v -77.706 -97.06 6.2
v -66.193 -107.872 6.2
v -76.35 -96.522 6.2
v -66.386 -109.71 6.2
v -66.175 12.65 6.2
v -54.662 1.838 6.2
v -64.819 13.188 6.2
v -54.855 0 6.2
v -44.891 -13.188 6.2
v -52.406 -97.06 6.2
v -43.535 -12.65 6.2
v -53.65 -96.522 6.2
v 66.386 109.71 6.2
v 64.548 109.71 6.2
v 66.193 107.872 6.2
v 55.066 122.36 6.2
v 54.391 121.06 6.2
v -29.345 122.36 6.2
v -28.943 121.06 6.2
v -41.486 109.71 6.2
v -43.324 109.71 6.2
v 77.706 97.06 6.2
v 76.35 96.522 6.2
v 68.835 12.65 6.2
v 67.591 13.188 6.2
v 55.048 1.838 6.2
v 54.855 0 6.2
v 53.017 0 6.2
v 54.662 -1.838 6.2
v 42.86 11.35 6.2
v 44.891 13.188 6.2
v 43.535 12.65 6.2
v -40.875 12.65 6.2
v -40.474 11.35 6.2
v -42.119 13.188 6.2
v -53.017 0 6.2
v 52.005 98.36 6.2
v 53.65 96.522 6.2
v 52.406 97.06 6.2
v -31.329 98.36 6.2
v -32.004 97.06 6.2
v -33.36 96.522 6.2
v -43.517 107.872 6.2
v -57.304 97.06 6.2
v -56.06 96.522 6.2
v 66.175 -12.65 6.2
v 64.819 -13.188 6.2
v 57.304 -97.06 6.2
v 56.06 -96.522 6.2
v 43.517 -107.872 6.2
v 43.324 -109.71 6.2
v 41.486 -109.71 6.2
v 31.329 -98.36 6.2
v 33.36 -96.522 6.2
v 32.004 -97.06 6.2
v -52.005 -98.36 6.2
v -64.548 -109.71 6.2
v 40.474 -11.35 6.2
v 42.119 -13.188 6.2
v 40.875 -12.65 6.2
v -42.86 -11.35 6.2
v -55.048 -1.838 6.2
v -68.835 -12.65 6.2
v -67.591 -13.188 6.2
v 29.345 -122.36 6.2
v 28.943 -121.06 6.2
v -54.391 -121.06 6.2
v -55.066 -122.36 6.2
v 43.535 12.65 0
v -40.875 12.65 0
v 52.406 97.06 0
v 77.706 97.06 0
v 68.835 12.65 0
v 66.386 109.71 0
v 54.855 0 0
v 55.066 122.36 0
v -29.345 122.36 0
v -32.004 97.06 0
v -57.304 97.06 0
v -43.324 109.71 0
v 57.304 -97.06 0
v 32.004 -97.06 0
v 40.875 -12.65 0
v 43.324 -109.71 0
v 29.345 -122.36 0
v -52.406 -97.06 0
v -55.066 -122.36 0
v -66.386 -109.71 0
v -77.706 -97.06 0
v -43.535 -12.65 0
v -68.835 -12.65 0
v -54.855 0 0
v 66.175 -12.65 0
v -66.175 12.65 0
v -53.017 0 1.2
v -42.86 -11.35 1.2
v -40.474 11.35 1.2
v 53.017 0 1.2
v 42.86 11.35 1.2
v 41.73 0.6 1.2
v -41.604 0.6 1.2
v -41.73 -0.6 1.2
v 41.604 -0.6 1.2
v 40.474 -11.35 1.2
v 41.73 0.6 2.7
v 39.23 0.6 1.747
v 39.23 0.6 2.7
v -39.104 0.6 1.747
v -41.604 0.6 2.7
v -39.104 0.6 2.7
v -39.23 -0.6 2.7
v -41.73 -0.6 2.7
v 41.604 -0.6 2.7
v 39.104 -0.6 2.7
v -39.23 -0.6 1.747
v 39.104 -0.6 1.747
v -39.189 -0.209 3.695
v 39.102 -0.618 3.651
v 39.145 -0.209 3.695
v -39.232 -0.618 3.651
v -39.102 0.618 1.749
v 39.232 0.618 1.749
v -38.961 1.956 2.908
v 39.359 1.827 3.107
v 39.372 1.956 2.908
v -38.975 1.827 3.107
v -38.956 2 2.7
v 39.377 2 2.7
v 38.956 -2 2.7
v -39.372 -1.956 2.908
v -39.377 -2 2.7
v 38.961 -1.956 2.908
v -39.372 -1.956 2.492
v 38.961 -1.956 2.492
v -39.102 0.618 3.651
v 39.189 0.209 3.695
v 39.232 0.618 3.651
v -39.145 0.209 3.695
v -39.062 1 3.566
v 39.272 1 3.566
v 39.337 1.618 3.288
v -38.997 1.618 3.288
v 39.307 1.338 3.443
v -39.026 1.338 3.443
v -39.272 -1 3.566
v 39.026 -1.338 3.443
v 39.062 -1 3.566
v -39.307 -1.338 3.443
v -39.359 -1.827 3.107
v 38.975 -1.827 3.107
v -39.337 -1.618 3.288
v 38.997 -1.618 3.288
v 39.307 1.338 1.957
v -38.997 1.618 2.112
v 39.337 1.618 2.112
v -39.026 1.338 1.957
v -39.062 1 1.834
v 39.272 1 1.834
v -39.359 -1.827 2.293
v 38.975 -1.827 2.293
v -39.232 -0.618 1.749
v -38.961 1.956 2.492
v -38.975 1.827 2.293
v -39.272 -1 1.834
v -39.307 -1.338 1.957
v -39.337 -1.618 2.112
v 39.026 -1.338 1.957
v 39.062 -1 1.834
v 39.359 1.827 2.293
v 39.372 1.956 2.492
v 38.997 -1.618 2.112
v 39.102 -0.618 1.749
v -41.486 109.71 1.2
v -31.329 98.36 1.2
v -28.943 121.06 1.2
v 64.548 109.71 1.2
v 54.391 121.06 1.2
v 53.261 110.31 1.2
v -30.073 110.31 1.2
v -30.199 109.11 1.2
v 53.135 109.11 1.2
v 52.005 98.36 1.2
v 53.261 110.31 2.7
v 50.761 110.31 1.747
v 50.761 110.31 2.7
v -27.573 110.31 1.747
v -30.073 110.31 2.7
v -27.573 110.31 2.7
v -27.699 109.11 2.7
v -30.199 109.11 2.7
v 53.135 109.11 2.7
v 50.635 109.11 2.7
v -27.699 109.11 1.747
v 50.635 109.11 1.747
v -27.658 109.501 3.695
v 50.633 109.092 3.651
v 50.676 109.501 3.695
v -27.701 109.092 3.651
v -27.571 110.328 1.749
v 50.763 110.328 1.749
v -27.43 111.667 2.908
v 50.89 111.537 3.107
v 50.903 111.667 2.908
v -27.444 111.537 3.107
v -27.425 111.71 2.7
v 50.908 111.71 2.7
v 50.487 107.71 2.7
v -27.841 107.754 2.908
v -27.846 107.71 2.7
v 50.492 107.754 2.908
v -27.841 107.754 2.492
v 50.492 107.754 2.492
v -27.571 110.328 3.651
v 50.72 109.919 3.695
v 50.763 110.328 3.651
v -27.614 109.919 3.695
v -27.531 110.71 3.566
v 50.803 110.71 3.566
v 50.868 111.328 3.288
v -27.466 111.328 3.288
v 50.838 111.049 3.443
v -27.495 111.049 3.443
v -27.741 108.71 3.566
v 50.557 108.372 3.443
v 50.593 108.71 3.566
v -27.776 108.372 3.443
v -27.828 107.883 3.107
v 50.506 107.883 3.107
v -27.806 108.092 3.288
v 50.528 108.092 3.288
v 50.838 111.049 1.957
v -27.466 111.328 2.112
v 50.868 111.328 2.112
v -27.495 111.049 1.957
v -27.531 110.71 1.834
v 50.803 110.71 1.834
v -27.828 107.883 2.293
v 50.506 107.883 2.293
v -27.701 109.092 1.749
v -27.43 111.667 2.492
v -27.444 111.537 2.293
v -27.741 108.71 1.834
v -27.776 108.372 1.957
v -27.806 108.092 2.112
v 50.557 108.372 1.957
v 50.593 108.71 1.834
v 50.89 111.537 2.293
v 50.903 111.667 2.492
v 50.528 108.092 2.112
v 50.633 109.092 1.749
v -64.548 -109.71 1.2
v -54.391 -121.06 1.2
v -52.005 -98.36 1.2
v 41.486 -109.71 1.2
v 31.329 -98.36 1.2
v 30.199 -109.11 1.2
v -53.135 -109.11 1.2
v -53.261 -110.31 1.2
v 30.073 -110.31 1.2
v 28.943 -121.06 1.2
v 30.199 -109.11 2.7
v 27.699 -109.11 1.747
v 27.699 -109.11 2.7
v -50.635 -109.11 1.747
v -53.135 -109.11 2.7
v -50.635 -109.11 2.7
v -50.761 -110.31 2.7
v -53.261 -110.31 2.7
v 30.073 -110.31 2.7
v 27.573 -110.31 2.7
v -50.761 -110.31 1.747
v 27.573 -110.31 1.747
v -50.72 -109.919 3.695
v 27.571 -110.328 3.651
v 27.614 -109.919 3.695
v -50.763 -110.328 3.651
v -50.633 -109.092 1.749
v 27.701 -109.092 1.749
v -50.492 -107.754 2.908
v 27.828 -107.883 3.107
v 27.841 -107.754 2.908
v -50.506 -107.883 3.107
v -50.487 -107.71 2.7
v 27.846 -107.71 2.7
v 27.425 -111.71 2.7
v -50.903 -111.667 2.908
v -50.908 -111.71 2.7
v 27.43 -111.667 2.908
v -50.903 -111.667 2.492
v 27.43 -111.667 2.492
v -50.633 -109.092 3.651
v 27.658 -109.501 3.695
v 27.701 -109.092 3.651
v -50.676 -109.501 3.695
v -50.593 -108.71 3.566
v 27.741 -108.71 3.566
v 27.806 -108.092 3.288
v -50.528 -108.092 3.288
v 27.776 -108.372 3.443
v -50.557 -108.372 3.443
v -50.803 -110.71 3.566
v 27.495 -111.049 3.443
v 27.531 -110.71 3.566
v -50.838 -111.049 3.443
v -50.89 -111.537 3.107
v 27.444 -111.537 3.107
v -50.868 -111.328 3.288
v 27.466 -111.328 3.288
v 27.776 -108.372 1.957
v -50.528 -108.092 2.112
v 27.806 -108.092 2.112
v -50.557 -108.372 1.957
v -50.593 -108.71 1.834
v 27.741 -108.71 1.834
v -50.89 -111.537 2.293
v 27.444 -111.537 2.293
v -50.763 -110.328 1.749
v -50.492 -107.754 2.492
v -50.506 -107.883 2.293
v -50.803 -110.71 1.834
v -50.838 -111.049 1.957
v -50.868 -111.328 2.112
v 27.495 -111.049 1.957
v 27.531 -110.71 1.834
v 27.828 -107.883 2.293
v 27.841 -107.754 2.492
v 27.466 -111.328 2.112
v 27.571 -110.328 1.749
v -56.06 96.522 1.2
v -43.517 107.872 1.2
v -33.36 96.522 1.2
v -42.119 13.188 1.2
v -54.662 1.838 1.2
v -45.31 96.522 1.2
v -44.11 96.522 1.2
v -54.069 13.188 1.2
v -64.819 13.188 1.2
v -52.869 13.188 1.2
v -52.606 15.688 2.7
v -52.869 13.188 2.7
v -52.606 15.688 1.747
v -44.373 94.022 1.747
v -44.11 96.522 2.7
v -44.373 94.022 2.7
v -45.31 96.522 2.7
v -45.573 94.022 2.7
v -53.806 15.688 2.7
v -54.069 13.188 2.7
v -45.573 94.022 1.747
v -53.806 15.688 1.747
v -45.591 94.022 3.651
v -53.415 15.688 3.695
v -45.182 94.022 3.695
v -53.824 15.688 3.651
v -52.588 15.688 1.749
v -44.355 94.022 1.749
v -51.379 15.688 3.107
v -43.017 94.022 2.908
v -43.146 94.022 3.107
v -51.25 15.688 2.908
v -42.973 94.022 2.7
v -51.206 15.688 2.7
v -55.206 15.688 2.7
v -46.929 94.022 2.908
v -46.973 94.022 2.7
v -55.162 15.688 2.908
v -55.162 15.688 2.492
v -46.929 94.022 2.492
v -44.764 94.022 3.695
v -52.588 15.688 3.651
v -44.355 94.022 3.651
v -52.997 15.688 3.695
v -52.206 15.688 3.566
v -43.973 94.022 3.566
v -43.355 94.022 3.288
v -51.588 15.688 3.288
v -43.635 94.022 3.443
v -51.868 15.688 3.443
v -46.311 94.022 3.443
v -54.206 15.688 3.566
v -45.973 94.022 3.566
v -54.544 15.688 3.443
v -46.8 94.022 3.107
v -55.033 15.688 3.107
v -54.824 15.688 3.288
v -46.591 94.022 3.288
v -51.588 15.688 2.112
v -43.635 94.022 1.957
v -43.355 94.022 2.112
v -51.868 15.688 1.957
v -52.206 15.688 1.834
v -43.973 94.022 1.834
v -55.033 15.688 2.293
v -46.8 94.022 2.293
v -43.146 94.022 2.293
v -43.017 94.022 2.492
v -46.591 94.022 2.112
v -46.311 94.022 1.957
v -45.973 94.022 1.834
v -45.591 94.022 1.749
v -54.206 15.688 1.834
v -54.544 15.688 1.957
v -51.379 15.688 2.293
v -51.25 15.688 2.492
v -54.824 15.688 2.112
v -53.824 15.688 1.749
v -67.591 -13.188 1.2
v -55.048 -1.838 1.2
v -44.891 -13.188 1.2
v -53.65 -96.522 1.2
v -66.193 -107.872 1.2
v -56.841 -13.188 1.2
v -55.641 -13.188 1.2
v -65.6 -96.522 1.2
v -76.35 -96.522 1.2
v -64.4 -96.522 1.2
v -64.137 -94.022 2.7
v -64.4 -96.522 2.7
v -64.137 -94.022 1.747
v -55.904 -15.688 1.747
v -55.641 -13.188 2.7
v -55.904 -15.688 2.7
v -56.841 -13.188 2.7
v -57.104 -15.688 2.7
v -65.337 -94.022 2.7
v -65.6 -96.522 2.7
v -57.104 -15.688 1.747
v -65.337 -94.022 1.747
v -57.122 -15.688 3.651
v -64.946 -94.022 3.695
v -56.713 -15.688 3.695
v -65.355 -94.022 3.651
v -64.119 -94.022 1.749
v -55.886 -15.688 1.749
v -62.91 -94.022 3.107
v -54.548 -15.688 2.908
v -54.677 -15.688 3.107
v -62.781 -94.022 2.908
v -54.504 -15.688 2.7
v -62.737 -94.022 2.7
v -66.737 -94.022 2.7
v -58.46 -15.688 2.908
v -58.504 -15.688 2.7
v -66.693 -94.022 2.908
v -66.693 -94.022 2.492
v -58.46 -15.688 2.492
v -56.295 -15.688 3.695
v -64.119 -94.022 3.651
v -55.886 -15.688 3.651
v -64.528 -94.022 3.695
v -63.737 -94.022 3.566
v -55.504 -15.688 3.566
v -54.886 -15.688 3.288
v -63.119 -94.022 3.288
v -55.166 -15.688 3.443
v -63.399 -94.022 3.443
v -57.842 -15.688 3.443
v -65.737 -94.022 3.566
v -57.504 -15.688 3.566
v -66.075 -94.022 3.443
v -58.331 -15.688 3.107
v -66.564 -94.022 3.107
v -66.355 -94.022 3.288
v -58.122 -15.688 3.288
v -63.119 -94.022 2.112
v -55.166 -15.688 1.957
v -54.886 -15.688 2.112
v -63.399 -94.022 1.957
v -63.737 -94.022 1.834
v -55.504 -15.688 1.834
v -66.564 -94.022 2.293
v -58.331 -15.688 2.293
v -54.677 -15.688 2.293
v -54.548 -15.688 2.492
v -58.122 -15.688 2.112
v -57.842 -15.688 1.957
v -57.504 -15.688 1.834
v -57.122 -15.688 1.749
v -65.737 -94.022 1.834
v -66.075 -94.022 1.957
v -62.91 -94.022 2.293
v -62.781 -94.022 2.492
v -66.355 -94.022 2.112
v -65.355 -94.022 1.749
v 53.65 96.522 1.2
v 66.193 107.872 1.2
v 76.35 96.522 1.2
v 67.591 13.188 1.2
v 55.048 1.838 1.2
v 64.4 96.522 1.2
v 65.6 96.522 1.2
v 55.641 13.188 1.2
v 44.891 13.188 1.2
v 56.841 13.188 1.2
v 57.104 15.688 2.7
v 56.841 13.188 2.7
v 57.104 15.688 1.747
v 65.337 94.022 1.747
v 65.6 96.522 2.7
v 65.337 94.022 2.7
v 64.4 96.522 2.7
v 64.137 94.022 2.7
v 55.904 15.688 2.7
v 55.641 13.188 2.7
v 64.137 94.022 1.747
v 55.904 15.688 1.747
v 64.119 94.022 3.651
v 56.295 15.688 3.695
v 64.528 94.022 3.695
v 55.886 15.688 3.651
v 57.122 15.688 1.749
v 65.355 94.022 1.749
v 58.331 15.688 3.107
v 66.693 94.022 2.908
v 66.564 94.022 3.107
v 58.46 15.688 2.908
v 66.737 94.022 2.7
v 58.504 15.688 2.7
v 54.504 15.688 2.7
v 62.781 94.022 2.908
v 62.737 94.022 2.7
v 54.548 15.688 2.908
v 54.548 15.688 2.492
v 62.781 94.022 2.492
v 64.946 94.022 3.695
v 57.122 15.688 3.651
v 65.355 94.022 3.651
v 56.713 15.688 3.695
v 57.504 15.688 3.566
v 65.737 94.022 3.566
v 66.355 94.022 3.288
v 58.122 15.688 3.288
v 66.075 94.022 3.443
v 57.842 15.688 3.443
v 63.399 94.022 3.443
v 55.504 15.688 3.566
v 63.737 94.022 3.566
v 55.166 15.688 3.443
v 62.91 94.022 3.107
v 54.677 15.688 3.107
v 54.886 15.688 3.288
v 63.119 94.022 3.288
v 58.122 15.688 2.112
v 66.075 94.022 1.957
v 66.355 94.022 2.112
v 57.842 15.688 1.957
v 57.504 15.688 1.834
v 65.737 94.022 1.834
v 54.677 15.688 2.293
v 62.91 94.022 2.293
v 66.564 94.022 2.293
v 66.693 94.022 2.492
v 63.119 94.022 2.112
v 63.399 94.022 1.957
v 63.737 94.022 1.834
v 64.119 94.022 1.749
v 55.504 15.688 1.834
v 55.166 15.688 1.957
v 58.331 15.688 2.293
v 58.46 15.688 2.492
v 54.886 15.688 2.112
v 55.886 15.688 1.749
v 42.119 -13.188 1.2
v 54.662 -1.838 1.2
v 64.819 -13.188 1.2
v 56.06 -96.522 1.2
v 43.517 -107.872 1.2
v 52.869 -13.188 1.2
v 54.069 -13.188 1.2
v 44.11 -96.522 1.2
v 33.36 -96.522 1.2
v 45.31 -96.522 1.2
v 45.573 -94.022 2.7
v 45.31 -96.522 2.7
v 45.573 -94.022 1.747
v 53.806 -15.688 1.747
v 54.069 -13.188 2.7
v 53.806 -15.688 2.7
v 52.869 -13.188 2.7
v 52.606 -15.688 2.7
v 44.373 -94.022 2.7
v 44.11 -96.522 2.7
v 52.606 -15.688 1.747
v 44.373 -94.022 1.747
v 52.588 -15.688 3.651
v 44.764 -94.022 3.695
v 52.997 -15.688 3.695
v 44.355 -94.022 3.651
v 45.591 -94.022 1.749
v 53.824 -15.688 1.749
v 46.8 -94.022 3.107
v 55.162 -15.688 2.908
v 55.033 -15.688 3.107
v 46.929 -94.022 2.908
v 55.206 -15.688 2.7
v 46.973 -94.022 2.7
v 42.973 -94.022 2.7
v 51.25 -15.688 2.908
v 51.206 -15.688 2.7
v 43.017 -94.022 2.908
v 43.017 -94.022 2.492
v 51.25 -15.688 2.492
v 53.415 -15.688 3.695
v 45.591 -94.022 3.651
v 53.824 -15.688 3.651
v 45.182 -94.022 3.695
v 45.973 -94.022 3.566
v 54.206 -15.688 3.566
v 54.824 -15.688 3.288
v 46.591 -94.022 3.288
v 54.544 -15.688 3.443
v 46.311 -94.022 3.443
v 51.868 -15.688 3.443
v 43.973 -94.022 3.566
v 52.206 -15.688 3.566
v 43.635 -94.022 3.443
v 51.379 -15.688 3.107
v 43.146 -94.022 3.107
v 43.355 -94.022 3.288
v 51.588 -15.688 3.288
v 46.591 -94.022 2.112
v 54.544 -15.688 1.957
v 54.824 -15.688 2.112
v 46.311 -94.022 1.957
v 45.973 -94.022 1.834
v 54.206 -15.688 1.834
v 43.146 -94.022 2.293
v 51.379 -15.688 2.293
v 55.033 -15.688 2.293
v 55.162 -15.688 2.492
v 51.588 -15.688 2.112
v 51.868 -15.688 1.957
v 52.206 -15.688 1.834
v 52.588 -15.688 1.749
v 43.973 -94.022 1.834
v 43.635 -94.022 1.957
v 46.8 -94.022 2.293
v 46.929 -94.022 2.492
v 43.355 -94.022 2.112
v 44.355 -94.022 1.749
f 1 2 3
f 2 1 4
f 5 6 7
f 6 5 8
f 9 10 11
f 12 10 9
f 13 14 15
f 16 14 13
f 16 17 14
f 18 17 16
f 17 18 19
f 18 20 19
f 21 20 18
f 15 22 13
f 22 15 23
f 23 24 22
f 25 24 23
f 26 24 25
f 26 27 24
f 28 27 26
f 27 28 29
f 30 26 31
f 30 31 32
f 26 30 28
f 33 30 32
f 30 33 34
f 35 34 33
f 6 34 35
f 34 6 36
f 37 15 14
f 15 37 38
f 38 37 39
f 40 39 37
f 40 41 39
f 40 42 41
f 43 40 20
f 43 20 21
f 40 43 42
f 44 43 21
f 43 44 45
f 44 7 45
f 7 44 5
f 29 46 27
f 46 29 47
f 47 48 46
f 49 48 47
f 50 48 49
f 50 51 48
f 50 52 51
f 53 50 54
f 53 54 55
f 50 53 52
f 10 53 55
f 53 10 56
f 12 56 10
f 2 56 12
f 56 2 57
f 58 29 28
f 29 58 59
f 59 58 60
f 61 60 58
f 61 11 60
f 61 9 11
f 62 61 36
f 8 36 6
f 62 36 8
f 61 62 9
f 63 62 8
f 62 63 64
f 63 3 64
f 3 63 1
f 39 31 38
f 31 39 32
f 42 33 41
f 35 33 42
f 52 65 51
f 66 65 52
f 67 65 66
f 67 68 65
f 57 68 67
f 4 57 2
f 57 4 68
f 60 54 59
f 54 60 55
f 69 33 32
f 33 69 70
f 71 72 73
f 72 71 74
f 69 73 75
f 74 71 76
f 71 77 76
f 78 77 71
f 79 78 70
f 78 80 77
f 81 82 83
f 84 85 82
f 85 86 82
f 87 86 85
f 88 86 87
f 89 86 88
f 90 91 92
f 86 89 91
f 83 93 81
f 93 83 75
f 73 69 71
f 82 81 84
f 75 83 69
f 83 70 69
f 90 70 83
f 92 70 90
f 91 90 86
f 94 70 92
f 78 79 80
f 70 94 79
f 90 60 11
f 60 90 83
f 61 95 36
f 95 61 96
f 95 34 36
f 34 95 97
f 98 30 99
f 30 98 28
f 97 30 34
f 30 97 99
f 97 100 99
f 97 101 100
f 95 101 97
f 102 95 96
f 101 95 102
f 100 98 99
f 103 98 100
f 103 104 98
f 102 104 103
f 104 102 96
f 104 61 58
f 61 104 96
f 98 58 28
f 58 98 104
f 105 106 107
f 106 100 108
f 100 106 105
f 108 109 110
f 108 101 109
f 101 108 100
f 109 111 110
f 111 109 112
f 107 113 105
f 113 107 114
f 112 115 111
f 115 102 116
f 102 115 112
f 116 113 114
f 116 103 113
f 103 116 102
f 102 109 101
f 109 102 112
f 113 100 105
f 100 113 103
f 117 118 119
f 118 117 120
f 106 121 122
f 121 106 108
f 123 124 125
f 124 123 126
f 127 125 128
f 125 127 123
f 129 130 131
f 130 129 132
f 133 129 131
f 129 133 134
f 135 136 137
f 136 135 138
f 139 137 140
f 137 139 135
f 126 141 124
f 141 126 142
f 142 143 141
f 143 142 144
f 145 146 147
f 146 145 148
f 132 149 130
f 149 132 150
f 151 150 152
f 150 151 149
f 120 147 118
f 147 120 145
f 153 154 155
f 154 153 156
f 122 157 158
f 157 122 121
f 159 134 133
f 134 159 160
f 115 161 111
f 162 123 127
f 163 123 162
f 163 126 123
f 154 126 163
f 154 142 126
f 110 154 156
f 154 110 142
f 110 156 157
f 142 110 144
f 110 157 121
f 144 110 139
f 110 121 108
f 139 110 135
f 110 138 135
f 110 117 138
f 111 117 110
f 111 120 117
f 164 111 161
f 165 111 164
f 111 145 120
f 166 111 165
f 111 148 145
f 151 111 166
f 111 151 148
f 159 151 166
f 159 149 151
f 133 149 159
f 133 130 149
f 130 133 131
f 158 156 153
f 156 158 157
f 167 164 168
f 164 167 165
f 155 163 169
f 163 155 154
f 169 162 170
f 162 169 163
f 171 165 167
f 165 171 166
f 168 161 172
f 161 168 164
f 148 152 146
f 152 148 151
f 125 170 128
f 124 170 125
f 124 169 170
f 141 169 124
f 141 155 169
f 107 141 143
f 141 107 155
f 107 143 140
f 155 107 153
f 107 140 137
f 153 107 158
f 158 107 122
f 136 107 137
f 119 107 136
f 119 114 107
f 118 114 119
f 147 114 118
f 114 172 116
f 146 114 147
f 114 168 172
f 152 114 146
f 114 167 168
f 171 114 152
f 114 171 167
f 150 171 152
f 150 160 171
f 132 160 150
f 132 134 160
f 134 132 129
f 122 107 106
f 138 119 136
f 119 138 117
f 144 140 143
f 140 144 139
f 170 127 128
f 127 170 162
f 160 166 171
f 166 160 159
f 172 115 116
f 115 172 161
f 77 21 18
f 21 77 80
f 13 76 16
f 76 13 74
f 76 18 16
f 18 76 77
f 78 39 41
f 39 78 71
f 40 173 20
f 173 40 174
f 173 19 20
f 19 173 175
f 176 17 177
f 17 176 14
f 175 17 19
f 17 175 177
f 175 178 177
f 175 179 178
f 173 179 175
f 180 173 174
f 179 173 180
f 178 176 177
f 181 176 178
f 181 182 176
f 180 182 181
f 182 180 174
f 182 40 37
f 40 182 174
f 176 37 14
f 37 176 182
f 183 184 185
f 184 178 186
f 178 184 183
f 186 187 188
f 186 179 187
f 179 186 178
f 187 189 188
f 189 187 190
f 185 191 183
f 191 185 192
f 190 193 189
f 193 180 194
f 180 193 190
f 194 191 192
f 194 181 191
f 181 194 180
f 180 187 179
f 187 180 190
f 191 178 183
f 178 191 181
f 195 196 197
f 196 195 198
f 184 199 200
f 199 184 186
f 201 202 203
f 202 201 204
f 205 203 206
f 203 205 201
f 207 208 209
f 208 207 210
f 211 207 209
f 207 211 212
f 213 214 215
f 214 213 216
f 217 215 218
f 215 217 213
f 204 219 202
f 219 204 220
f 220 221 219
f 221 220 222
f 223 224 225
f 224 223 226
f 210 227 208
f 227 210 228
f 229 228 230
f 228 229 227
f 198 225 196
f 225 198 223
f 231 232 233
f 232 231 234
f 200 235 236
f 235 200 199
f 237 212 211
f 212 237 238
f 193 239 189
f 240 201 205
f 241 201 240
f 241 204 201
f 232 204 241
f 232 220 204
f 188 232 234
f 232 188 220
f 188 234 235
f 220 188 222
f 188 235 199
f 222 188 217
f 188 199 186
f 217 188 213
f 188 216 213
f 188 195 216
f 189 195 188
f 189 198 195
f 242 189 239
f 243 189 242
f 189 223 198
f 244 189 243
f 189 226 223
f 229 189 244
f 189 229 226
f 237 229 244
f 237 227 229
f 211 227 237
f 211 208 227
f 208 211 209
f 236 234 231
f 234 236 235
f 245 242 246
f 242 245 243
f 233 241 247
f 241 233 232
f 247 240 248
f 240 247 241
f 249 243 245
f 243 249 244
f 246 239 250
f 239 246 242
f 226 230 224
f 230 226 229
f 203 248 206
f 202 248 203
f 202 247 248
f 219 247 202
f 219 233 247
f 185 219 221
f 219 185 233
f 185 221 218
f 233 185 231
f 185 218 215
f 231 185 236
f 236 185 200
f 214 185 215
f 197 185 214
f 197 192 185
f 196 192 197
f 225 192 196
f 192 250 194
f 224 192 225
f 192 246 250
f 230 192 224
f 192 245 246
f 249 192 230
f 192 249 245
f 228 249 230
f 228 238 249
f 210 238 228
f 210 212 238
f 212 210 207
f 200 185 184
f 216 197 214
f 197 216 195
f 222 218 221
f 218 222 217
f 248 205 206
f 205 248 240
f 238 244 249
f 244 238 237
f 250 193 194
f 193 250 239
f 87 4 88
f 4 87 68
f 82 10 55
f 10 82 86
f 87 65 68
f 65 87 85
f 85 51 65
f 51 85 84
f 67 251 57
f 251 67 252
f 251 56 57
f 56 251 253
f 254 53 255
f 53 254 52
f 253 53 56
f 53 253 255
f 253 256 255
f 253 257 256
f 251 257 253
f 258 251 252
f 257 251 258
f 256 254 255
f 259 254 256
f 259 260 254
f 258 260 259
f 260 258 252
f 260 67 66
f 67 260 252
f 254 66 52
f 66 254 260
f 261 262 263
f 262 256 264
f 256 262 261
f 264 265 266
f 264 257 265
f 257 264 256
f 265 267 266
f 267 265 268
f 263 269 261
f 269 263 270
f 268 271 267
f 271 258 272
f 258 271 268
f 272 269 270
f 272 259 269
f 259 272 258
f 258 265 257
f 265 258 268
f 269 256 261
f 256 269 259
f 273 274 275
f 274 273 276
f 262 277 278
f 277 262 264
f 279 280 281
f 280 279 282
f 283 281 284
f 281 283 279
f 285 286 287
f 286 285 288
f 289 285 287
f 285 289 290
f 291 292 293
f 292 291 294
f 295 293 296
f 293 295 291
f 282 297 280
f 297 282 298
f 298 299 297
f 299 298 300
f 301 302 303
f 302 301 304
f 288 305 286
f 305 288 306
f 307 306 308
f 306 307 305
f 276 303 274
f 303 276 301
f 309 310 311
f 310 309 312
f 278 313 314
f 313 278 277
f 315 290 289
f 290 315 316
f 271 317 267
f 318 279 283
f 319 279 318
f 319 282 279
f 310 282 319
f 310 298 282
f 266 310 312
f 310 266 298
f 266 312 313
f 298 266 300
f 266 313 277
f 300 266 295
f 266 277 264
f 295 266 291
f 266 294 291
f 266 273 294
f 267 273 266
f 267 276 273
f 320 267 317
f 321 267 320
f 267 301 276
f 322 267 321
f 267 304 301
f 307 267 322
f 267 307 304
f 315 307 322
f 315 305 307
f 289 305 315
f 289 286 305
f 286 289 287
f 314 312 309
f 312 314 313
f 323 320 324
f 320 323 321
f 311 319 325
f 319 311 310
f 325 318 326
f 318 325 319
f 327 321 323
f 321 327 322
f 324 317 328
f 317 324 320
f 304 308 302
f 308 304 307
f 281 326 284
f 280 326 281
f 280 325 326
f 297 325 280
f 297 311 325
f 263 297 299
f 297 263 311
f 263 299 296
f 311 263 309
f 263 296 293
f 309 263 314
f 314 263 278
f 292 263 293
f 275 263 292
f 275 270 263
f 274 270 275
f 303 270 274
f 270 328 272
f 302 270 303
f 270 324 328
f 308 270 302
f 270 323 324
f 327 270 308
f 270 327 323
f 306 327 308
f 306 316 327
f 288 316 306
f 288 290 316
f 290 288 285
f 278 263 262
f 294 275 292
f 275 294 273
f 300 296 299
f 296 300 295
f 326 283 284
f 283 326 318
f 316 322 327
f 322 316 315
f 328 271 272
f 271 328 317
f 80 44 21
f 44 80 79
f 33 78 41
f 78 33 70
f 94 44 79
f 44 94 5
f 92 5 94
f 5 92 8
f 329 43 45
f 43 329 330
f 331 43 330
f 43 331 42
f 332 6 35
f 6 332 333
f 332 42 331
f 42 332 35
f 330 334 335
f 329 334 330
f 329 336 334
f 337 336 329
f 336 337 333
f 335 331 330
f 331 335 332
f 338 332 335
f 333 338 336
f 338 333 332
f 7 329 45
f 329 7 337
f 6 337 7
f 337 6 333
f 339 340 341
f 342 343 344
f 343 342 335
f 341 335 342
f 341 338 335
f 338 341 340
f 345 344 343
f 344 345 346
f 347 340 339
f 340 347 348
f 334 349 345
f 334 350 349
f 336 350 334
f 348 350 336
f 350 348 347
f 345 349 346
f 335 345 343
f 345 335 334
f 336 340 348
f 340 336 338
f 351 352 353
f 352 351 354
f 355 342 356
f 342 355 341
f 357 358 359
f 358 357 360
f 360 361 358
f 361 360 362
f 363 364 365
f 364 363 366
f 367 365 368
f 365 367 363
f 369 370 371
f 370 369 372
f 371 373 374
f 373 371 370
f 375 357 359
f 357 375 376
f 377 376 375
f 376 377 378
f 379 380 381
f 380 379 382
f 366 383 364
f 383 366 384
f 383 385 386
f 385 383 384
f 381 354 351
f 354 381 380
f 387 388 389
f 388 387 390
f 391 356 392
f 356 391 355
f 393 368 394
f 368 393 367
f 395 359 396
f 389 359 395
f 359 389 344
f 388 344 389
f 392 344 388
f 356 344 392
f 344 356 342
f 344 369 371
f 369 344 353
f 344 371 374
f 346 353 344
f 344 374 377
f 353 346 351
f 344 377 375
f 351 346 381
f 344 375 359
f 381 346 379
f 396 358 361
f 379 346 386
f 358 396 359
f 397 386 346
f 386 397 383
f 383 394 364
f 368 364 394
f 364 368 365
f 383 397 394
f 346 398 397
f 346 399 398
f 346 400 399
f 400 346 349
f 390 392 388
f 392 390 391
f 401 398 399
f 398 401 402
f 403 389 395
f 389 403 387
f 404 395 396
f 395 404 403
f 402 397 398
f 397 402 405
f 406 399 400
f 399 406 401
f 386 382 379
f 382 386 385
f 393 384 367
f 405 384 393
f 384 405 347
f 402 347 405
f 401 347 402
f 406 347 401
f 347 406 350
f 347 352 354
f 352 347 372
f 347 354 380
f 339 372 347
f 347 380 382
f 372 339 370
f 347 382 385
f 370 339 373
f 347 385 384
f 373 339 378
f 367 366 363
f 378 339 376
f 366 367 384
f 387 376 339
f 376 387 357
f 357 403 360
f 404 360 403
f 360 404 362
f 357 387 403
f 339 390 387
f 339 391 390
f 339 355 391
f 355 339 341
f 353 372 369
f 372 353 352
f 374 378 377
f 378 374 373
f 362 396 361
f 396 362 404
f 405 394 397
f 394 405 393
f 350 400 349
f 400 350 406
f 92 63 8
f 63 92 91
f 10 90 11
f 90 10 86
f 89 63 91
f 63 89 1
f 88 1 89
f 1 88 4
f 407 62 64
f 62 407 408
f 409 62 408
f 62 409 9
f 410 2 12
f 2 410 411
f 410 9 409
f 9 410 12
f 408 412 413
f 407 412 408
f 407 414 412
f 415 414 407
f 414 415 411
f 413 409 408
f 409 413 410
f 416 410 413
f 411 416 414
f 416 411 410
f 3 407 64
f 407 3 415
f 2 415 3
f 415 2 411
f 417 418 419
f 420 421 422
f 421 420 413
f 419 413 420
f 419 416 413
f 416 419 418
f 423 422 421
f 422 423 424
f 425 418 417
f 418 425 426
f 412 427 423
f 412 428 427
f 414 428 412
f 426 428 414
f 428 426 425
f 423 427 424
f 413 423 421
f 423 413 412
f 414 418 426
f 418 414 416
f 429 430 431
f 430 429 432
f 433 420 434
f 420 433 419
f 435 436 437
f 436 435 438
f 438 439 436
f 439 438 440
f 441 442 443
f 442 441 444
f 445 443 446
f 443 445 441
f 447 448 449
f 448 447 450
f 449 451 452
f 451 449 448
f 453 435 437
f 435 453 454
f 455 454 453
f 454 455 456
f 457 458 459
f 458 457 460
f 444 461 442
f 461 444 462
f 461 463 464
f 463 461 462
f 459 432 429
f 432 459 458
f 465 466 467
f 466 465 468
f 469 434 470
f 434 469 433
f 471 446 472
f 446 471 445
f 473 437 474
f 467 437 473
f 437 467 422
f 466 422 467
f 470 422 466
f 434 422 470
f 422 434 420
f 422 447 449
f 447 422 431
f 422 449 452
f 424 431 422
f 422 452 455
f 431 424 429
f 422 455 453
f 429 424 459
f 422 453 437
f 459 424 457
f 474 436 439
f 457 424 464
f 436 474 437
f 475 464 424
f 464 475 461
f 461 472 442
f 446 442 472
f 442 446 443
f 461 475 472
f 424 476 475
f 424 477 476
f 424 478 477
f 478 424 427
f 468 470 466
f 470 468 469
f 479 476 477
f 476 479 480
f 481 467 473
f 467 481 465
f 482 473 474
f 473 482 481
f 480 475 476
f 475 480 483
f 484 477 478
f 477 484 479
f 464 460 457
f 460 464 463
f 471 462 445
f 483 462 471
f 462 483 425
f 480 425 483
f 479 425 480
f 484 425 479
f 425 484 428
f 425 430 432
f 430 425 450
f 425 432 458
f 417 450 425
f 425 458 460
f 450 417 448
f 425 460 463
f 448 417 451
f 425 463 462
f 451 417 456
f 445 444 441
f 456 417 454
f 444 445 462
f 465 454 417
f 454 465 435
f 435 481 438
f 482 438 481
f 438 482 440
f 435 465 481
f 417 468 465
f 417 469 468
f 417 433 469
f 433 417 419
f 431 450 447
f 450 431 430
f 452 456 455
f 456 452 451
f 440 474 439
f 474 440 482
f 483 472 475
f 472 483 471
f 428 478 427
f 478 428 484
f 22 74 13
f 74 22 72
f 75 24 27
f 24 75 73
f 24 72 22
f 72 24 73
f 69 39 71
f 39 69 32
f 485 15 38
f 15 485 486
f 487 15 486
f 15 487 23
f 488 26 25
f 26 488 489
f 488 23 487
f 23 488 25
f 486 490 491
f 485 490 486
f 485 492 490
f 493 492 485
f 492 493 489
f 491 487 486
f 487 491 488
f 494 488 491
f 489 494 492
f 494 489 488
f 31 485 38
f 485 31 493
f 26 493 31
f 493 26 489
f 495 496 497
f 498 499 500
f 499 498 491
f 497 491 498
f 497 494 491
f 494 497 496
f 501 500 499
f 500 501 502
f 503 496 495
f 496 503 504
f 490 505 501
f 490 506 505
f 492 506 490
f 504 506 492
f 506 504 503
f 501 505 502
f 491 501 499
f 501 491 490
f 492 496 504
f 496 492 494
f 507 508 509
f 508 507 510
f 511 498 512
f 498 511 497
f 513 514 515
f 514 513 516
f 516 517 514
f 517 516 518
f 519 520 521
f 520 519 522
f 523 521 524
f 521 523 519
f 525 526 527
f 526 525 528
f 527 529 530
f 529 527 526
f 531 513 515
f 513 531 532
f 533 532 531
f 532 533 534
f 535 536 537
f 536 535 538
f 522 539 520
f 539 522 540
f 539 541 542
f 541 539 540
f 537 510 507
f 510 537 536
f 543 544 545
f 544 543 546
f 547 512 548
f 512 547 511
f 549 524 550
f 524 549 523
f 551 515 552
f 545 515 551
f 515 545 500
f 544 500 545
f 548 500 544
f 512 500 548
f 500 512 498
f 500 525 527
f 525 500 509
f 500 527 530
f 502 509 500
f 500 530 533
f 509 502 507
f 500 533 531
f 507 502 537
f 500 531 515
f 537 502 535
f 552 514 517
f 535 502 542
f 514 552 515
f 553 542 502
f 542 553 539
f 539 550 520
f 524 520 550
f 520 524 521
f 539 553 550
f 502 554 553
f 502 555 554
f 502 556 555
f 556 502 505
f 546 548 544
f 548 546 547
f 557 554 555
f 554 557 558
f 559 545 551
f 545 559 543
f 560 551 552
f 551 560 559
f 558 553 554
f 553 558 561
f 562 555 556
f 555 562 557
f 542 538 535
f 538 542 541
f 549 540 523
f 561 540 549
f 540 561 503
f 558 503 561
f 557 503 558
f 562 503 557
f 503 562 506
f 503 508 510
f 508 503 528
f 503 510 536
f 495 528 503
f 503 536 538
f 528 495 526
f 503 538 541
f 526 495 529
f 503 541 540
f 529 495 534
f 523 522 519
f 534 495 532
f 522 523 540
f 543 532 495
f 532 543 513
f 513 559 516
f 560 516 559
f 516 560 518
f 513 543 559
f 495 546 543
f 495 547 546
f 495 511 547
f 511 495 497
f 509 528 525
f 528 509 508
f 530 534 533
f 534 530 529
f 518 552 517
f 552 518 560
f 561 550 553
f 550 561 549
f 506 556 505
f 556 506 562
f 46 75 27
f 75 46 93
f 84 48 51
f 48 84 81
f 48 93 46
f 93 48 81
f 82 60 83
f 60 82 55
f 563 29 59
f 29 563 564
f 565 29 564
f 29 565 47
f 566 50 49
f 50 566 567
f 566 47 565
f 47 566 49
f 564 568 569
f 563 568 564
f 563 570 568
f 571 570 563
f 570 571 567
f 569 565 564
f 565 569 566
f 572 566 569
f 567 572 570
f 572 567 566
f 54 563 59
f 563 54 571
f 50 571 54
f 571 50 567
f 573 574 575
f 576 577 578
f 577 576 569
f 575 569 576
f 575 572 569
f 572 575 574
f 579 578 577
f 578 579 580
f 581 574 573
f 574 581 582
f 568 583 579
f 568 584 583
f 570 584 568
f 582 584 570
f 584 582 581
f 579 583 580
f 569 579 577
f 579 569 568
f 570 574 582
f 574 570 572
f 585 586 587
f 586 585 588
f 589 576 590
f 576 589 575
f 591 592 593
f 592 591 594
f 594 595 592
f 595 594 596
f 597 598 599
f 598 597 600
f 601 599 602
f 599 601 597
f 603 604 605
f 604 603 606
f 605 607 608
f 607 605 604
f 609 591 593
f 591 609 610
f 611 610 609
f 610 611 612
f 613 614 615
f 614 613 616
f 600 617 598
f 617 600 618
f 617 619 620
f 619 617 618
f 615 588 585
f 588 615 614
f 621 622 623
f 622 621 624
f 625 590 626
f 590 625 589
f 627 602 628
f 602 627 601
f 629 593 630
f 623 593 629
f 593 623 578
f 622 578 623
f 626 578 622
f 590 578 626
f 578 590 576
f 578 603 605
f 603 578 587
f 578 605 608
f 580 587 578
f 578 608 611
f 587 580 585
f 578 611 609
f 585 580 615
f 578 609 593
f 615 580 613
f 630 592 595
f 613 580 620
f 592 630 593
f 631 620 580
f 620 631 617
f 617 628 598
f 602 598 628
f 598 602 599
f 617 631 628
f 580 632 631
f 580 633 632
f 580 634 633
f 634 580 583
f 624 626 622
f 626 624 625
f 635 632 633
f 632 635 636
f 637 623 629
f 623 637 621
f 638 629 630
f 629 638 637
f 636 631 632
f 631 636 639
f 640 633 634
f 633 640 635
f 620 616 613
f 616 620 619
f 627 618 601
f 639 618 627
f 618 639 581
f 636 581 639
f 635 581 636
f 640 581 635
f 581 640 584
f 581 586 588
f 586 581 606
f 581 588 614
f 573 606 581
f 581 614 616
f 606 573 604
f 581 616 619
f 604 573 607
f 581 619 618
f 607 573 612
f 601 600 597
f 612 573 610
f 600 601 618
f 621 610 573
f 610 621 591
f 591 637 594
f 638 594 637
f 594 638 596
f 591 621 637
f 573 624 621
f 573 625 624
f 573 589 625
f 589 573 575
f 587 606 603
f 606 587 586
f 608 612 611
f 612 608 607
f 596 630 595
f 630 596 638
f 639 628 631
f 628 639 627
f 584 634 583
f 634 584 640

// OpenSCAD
// file: skew.scad
/**
* A utility function to skew an object.
*
* Taken from https://gist.github.com/boredzo/fde487c724a40a26fa9c
* Peter Hosey (boredzo)
* As amended by ziggy90127 
*
* skew takes an array of six angles:
* x along y
* x along z
* y along x
* y along z
* z along x
* z along y
***************************************************************************/
module skew(dims) 
{
    matrix = [
        [ 1, tan(dims[0]), tan(dims[1]), 0 ],
        [ tan(dims[2]), 1, tan(dims[3]), 0 ],
        [ tan(dims[4]), tan(dims[5]), 1, 0 ],
        [ 0, 0, 0, 1 ]
    ];
    multmatrix(matrix) children();
}
// main file
// ****************************************************************************
//
//    7SegLED - a 3D printable 7-segment LED
//
//    Copyright (C) 2017 John Winans
//
//    This program is free software: you can redistribute it and/or modify
//    it under the terms of the GNU General Public License as published by
//    the Free Software Foundation, either version 3 of the License, or
//    (at your option) any later version.
//
//    This program is distributed in the hope that it will be useful,
//    but WITHOUT ANY WARRANTY; without even the implied warranty of
//    MERCHANTABILITY or FITNESS FOR A PARTICULAR PURPOSE.  See the
//    GNU General Public License for more details.
//
//    You should have received a copy of the GNU General Public License
//    along with this program. If not, see <http://www.gnu.org/licenses/>.
//
//
//    Get your copy from here:
//
//       https://github.com/johnwinans/7SegLED
//       
// ****************************************************************************

include <skew.scad>

ledLen=100/6;           // length of each LED in the strip
ledWidth=10;            // width of one LED strip
wallThickness=1.3;      // the thickness of the segment side-walls
dividerWidth=1.2;       // the width of the strip-divider
dividerHeight=1.5;      // the height of the strip-divider
slotWidth=ledWidth+.75; // the width of the slot needed for an LED strip
segNumLedStrips=2;      // how many LED strips per segment
segNumStripLeds=5;      // how many LEDs per strip
wireHoleSize=4.5;

segInsideWidth = segNumLedStrips*slotWidth+(segNumLedStrips-1)*dividerWidth;   // gross segment inside width
segOutsideWidth = segInsideWidth+2*wallThickness; // gross segment outside width

segInsideLength = segNumStripLeds*ledLen;         // inside length (w/o end-caps)
segOutsideLength = segInsideLength+2*(tan(45/2)*wallThickness);   // outside length (w/o end-caps)

segBackThickness=1.2;   // The thickness of the back
segBackDepth=5;         // How deep to make the LED strip slots
segFrontThickness=1.2;  // The thickness of the front (face of the diffuser)
segFrontDepth=13;       // how deep to make the front

segGrossBackZ = segBackDepth+segBackThickness;    // Gross Z-height of the back
segGrossFrontZ = segFrontDepth+segFrontThickness; // Gross Z-height of the front 

skew([6,0,0,0,0,0]) back7();
//skew([-6,0,0,0,0,0]) front7();

*difference()
{
    back();
    translate([0,-50,0])cube([100,100,100], center=true);
}

module front7()
{
    rotate([0,0,90]) front();
    translate([0,(segOutsideLength+segOutsideWidth),0]) rotate([0,0,90]) front();
    translate([0,-(segOutsideLength+segOutsideWidth),0]) rotate([0,0,90]) front();
    
    translate([-(segOutsideLength/2+segOutsideWidth/2)+.0001,(segOutsideLength/2+segOutsideWidth/2),0]) front();
    translate([-(segOutsideLength/2+segOutsideWidth/2)+.0001,-(segOutsideLength/2+segOutsideWidth/2),0]) front();
    translate([(segOutsideLength/2+segOutsideWidth/2)-.0001,(segOutsideLength/2+segOutsideWidth/2),0]) front();
        translate([(segOutsideLength/2+segOutsideWidth/2)-.0001,-(segOutsideLength/2+segOutsideWidth/2),0]) front();
}


module back7()
{
    rotate([0,0,90]) back();
    translate([0,(segOutsideLength+segOutsideWidth),0]) rotate([0,0,90]) back();
    translate([0,-(segOutsideLength+segOutsideWidth),0]) rotate([0,0,90]) back();
    
    translate([-(segOutsideLength/2+segOutsideWidth/2)+.0001,(segOutsideLength/2+segOutsideWidth/2),0]) back();
    translate([-(segOutsideLength/2+segOutsideWidth/2)+.0001,-(segOutsideLength/2+segOutsideWidth/2),0]) back();
    translate([(segOutsideLength/2+segOutsideWidth/2)-.0001,(segOutsideLength/2+segOutsideWidth/2),0]) back();
        translate([(segOutsideLength/2+segOutsideWidth/2)-.0001,-(segOutsideLength/2+segOutsideWidth/2),0]) back();
}


/**
* One complete front/diffuser segment.
************************************************************************/
module front()
{
    segment(segInsideWidth, segInsideLength, 
        segOutsideWidth, segOutsideLength, 
        segFrontThickness, segFrontDepth);
}


/**
* One complete back segment.
************************************************************************/
module back()
{
    segment(segInsideWidth, segInsideLength, 
        segOutsideWidth, segOutsideLength, 
        segBackThickness, segGrossBackZ);
    
    for ( x = [-segInsideWidth/2+slotWidth+dividerWidth/2 : slotWidth+dividerWidth : segInsideWidth/2] )
    {
        translate([x,0,dividerHeight/2+segBackThickness]) cube([dividerWidth, segInsideLength, dividerHeight], center=true);
        translate([x,0,dividerHeight+segBackThickness]) scale([1,1,.5]) rotate([90,0,0]) cylinder(d=4, h=segInsideLength-ledLen*.3, center=true, $fn=30);
    }
}


/**
* A single hollow segment.
*
* @param iw The width of the inside (cut-out) portion of the segment.
* @param il The inside length (cap-center to cap-center) of the segment.
* @param ow The outside width of the segment.
* @param ol The outside length (cap-center to cap-center) of the segment.
* @param iz The thickness of the segment back/face.
* @param gz The gross thickness of the segment in the Z axis.
************************************************************************/
module segment(iw, il, ow, ol, iz, gz)
{
    difference()
    {
        rawSegment(ow, ol, gz);
        translate([0,0,iz]) rawSegment(iw, il, gz);
    }
}


/**
* A solid segment.
*
* @param sw The width of the segment
* @param sl The length of the seg (centers of the cap cubes)
* @param z the thickness of the seg.
************************************************************************/
module rawSegment(sw, sl, z)
{
    cfl = sqrt((sw*sw)/2);	// the length of one face of an end-cap
    
    hull()
    {
        translate([0,sl/2,z/2]) rotate([0,0,45]) cube([cfl,cfl,z], center=true);
        translate([0,-sl/2,z/2]) rotate([0,0,45]) cube([cfl,cfl,z], center=true);
    }
}
